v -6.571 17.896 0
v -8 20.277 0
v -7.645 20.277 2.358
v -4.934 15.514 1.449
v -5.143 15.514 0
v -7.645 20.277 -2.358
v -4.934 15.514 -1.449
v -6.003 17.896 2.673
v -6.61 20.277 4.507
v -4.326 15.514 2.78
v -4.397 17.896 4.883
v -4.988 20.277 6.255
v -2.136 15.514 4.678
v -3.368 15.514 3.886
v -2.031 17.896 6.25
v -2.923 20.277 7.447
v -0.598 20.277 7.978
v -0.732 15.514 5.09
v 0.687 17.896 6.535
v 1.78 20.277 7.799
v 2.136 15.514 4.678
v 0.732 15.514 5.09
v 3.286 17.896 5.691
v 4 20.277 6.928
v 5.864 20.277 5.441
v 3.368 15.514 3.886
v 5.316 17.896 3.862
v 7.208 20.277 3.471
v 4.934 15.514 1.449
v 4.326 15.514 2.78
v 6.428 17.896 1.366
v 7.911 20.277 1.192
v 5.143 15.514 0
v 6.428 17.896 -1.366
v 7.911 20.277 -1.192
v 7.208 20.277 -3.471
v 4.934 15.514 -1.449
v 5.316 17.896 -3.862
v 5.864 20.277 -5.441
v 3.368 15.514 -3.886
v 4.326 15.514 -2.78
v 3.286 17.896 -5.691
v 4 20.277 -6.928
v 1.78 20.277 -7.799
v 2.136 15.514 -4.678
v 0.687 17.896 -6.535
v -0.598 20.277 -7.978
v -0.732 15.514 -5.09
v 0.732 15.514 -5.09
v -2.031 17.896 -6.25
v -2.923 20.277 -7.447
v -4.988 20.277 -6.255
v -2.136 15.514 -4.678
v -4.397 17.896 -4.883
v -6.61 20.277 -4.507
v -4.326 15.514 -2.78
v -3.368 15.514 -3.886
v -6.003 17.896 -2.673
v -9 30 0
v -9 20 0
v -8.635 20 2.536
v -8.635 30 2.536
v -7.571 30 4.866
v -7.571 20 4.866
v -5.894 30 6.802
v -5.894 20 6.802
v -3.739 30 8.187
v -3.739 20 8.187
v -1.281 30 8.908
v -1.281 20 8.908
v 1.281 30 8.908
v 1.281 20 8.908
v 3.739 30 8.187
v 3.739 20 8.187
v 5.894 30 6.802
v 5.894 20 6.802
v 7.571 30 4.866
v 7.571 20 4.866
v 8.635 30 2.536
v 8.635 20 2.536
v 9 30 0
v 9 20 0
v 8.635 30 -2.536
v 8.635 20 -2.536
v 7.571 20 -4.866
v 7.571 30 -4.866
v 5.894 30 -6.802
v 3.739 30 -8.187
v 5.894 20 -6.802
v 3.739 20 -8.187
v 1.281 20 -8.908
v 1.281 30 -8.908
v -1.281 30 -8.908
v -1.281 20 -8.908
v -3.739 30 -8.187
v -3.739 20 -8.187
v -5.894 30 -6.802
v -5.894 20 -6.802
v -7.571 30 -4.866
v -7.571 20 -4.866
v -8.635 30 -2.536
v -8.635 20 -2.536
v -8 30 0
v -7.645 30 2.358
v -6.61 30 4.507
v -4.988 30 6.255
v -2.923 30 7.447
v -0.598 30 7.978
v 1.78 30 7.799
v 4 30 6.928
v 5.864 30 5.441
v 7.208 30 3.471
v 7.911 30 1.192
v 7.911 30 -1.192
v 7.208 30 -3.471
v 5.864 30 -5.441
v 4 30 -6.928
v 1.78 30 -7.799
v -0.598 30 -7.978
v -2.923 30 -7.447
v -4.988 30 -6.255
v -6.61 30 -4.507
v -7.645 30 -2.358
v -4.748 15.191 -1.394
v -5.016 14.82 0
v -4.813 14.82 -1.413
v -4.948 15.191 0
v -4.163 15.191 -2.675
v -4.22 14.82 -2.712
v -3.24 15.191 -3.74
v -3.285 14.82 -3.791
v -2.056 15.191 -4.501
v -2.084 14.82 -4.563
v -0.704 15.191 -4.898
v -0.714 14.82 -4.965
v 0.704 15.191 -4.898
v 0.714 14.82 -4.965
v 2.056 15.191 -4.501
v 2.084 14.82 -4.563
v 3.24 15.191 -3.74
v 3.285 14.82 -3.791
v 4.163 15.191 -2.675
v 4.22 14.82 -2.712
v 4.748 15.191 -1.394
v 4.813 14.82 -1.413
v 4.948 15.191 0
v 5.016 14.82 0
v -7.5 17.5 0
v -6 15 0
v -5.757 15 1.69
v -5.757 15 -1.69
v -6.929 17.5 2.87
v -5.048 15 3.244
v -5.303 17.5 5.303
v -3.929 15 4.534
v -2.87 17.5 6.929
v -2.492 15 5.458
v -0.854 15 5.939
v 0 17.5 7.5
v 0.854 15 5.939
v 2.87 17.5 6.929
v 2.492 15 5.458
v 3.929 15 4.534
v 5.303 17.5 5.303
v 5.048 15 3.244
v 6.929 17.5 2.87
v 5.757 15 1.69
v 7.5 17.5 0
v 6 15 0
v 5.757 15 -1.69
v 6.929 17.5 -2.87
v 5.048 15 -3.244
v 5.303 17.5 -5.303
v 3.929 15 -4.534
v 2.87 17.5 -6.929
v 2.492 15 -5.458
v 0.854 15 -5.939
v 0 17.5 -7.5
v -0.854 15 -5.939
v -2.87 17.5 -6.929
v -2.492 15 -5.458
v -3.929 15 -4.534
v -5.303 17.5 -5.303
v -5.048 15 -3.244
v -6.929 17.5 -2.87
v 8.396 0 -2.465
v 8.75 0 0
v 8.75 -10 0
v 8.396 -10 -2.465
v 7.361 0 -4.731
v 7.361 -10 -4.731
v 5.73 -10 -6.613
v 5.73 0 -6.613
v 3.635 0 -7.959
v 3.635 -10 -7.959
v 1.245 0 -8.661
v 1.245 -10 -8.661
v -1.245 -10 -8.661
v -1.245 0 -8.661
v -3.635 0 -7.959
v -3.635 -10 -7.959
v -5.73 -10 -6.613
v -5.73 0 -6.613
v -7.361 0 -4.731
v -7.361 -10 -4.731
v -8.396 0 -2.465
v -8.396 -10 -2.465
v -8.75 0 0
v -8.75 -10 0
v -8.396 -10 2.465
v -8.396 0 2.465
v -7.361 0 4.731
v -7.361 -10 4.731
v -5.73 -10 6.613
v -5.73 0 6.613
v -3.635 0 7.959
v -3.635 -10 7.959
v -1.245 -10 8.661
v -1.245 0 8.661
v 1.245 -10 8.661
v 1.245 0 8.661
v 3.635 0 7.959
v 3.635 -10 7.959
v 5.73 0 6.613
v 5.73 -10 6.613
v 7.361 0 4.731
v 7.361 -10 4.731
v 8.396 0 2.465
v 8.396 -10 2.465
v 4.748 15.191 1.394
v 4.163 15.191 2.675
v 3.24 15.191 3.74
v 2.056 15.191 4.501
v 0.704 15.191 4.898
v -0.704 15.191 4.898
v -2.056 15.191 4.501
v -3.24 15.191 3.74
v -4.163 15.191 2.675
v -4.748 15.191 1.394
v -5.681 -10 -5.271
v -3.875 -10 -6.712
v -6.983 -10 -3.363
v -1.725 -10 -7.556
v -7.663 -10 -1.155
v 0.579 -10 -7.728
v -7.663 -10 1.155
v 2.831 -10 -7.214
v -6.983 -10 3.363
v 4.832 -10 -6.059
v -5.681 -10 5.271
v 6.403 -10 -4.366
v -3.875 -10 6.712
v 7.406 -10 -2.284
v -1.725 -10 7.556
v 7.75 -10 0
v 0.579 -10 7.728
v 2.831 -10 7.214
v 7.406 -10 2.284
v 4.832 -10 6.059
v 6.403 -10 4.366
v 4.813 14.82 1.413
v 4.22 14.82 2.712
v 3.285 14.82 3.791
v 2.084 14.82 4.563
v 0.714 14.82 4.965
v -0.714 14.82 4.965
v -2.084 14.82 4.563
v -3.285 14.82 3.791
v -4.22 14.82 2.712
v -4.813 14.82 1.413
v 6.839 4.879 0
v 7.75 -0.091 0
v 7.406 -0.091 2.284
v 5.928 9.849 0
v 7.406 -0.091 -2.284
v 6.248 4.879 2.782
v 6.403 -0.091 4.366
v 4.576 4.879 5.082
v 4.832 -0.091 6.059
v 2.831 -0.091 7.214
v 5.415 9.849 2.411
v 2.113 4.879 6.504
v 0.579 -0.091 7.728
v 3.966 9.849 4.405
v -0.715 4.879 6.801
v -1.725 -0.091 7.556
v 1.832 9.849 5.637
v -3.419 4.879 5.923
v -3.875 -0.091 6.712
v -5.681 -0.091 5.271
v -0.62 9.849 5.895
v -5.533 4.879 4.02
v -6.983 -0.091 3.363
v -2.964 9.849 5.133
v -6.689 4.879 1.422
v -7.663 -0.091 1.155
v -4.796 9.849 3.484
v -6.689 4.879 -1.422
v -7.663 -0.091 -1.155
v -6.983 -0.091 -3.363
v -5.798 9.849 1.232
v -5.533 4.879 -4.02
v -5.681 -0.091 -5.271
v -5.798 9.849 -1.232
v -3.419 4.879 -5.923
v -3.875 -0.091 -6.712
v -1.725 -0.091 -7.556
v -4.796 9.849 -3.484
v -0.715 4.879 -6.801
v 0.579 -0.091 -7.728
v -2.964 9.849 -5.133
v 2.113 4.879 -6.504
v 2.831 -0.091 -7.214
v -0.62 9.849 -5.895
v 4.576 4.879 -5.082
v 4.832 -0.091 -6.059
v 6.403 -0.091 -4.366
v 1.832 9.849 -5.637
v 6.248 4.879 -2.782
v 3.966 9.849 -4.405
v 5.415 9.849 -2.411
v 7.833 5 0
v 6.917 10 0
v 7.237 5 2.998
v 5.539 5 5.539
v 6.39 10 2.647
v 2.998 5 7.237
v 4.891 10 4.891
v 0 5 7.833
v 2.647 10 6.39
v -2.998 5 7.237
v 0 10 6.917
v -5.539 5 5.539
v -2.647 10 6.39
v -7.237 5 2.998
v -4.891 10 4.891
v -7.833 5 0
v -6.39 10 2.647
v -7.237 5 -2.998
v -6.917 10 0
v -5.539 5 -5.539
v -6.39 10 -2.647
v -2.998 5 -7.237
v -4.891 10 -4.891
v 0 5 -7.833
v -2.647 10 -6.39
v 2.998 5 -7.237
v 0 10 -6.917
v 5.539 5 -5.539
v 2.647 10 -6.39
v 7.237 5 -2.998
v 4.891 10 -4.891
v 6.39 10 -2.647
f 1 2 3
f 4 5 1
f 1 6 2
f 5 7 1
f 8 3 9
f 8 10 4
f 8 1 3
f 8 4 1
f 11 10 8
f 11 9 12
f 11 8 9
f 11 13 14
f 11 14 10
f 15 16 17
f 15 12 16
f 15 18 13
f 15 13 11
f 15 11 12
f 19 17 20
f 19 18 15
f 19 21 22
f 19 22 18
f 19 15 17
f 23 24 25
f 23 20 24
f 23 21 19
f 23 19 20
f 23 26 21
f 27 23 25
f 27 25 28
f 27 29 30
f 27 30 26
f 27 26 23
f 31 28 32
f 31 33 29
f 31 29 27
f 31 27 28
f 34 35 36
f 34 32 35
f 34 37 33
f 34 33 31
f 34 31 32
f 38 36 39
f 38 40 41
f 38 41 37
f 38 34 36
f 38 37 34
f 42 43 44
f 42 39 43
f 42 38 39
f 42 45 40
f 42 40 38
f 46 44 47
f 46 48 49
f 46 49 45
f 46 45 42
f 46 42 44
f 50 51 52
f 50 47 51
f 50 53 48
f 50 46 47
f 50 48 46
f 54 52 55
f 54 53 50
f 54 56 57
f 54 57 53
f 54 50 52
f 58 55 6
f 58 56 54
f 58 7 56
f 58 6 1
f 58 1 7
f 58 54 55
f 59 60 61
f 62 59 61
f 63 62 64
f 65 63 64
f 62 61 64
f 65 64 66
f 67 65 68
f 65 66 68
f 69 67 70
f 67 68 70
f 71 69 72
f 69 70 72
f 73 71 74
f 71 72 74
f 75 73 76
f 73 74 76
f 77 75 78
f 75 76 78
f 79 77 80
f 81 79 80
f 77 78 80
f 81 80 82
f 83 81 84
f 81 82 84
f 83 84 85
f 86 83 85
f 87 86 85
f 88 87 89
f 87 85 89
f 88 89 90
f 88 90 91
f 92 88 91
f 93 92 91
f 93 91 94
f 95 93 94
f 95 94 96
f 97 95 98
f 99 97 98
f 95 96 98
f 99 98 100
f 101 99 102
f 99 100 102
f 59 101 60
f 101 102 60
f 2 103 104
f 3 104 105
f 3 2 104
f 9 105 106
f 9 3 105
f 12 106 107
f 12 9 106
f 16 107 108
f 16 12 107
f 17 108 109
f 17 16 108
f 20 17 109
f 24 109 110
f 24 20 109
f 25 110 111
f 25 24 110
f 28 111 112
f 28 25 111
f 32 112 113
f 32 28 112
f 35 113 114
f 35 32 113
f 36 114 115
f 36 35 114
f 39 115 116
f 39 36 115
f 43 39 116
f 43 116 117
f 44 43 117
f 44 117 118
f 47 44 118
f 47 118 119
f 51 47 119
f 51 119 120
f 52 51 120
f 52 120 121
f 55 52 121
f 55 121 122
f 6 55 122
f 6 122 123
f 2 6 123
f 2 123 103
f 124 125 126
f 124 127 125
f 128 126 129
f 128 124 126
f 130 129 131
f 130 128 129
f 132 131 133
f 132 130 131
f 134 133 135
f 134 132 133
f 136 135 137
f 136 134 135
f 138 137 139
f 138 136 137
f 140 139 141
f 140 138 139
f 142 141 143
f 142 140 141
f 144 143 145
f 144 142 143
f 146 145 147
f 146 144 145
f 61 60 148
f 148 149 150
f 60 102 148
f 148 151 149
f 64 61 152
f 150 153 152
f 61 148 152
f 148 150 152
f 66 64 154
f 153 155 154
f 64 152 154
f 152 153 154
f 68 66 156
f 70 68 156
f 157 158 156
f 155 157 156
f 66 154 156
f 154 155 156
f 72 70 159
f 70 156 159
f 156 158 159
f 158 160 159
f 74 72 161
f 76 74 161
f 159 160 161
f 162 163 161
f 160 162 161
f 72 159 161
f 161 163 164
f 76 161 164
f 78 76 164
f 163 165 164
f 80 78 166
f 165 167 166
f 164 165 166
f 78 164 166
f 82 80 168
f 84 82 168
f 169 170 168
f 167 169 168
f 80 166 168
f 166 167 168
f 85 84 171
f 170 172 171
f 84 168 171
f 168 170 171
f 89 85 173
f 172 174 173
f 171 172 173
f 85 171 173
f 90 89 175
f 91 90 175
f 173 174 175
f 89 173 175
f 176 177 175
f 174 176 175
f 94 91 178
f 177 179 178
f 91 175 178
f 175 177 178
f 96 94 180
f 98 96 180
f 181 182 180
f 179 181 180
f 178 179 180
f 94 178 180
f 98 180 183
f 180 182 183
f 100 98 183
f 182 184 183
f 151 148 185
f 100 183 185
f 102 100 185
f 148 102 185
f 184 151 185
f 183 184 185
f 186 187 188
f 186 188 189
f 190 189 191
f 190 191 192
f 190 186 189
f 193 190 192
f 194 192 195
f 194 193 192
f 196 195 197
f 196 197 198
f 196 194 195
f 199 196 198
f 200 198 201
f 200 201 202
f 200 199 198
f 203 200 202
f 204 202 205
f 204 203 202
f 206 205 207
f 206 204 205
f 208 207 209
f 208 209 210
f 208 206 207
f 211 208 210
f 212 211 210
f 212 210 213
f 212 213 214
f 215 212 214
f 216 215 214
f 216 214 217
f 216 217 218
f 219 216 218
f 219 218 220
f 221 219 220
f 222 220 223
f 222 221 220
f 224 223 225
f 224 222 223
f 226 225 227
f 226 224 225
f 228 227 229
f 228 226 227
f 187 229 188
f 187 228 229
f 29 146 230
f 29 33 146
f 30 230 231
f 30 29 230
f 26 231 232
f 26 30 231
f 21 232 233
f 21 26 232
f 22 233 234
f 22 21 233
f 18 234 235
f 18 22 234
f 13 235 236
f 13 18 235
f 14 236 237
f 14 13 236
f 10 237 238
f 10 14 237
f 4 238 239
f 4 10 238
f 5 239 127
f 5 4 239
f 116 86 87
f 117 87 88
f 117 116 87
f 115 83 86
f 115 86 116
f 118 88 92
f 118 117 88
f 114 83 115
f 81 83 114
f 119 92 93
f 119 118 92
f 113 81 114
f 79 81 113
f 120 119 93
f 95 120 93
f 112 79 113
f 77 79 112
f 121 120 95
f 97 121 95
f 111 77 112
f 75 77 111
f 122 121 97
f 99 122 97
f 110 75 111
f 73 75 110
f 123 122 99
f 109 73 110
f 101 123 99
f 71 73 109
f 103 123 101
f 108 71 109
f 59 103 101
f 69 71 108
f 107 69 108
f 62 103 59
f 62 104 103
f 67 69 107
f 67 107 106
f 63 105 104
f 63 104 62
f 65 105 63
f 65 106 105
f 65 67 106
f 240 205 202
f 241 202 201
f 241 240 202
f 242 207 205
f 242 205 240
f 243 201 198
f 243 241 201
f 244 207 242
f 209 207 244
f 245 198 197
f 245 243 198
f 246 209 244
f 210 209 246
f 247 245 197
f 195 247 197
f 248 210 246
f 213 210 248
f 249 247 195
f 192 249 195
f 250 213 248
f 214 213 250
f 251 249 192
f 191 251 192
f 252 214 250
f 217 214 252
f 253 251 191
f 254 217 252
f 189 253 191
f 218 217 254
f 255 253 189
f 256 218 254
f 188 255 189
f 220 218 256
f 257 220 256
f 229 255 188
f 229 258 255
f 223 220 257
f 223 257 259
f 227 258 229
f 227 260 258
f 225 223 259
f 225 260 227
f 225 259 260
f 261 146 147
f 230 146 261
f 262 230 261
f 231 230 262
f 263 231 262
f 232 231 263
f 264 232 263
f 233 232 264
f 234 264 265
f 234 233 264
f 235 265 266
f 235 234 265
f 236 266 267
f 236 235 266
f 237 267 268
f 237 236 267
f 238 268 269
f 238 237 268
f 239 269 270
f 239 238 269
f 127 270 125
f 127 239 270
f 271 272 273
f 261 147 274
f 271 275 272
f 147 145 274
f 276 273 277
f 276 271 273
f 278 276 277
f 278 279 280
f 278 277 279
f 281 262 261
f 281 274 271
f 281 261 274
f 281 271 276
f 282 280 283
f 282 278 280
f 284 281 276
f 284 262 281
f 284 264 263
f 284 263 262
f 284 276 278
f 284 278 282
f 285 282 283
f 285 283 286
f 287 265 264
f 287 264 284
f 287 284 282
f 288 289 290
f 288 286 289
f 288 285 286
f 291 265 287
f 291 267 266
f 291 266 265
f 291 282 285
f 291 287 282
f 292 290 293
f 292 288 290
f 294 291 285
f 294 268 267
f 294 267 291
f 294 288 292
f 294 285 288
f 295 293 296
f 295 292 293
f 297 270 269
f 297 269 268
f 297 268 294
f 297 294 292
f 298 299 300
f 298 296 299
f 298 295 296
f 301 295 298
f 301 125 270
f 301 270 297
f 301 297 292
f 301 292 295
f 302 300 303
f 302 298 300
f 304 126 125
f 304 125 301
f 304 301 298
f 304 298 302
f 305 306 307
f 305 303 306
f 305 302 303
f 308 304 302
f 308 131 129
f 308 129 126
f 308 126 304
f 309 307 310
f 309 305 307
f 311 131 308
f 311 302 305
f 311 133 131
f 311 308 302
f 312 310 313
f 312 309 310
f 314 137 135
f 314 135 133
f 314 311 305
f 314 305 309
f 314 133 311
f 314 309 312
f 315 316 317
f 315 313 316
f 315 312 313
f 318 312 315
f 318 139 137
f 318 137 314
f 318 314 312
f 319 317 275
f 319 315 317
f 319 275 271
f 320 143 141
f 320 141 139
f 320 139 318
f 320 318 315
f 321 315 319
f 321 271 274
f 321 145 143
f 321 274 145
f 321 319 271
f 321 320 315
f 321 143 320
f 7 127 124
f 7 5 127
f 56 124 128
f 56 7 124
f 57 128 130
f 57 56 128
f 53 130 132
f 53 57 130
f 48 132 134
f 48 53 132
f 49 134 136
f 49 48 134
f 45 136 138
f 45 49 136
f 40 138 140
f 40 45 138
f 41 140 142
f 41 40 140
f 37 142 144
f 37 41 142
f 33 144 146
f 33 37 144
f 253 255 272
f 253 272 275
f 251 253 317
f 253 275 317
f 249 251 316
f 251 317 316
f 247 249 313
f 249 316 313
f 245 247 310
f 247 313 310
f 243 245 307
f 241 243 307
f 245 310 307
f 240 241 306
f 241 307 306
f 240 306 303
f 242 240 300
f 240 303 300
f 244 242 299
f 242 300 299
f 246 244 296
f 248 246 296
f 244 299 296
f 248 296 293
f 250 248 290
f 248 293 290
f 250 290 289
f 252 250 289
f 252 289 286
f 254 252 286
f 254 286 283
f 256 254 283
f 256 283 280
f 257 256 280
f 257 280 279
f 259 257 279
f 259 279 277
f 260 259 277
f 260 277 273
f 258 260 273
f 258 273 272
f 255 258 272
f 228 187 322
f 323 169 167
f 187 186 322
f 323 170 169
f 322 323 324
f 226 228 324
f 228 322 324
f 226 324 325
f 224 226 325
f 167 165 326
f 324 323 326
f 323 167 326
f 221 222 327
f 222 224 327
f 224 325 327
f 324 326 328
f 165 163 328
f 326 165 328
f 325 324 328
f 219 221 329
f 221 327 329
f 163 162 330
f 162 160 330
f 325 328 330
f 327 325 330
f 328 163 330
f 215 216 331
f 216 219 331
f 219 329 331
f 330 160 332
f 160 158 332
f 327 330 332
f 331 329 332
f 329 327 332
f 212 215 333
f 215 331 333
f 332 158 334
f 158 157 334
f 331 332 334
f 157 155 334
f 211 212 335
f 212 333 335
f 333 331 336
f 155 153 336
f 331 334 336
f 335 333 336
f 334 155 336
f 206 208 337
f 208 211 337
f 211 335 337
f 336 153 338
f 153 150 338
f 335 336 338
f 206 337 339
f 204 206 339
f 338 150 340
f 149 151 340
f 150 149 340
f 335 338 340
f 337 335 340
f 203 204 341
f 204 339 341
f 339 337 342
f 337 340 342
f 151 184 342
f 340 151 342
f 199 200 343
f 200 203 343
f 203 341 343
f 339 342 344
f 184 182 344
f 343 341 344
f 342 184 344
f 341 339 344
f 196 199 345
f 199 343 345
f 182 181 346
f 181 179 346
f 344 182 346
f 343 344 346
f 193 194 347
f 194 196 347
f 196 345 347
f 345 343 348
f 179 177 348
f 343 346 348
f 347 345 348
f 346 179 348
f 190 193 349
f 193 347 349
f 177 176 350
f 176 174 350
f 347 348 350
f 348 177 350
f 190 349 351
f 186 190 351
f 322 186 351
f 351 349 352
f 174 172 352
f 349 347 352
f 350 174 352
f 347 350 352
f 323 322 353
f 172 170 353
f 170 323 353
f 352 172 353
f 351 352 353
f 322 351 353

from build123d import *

# Parameters (mm, degrees)
F0_R         = 8.75
F4_R         = 6
F6_DEPTH     = 10
F10_R        = 9
F5_FACE1_R   = 6
F12_DEPTH    = 10
F13_T        = 1
F13_T4_ANGLE = 180.000000001
F13_T6_ANGLE = 180.000000001


# Not quite as in the source:
# - a shell that OpenCascade refuses in one call is made with other operations: the cavity is built on its own and cut out


with BuildPart() as f5:
    # F0 (on Front) → F5 section 0
    with BuildSketch(Plane.XZ):
        Circle(F0_R)
    # F4 (on line) → F5 section 1
    with BuildSketch(Plane(origin=(0, 15, 0), x_dir=(-1, 0, 0), z_dir=(0, 1, 0))):
        Circle(F4_R)
    loft()

    # F6 (add): a face of the model
    f6_faces = [f5.faces().sort_by_distance(p)[0] for p in [
        (0, 0, 0),
    ]]
    extrude(f6_faces, amount=F6_DEPTH)

    # F10 (on line) → F11 section 0
    with BuildSketch(Plane(origin=(0, 20, 0), x_dir=(-1, 0, 0), z_dir=(0, 1, 0))):
        Circle(F10_R)
    # F5_face1 (on face) → F11 section 1
    with BuildSketch(Plane(origin=(0, 15, 0), x_dir=(-1, 0, 0), z_dir=(0, 1, 0))):
        Circle(F5_FACE1_R)
    loft()

    # F12 (add): a face of the model
    f12_faces = [f5.faces().sort_by_distance(p)[0] for p in [
        (0, 20, 0),
    ]]
    extrude(f12_faces, amount=F12_DEPTH)

    # F13: shell of thickness 1, made by hand


with BuildPart() as f13_core1:
    # F13_t2: copy of F5
    add(f5.part)

    # the walls: a layer under each face that stays
    f13_faces = [f13_core1.faces().sort_by_distance(p)[0] for p in [
        (-7.375, 7.5, 0),
        (7.5, 17.5, 0),
        (-8.75, -5, 0),
        (9, 25, 0),
    ]]
    thicken(f13_faces, amount=-F13_T, mode=Mode.SUBTRACT)

    # F13_s3 → F13_t4 (revolve, cut)
    with BuildSketch(Plane.XY):
        Polygon((6.0184109948, 14.9966583211), (5.0163934426, 14.8196721311), (4.9483384219, 15.1908813349), (5.1425070743, 15.5144957554), align=None)
    revolve(axis=Axis((0, 15, 0), (0, -1, 0)), revolution_arc=F13_T4_ANGLE, mode=Mode.SUBTRACT)

    # F13_s5 → F13_t6 (revolve, cut)
    with BuildSketch(Plane.XY):
        Polygon((-6.0184109948, 14.9966583211), (-5.0163934426, 14.8196721311), (-4.9483384219, 15.1908813349), (-5.1425070743, 15.5144957554), align=None)
    revolve(axis=Axis((0, 15, 0), (0, -1, 0)), revolution_arc=F13_T6_ANGLE, mode=Mode.SUBTRACT)


with BuildPart() as f5_1:
    add(f5.part)

    # what is left inside the walls is the cavity
    f13_cavity = [f13_core1.part.solids().sort_by_distance(p)[0] for p in [
        (-6.828962, 4.877481, 0),
    ]]
    add(f13_cavity, mode=Mode.SUBTRACT)


solid = f5_1.part
